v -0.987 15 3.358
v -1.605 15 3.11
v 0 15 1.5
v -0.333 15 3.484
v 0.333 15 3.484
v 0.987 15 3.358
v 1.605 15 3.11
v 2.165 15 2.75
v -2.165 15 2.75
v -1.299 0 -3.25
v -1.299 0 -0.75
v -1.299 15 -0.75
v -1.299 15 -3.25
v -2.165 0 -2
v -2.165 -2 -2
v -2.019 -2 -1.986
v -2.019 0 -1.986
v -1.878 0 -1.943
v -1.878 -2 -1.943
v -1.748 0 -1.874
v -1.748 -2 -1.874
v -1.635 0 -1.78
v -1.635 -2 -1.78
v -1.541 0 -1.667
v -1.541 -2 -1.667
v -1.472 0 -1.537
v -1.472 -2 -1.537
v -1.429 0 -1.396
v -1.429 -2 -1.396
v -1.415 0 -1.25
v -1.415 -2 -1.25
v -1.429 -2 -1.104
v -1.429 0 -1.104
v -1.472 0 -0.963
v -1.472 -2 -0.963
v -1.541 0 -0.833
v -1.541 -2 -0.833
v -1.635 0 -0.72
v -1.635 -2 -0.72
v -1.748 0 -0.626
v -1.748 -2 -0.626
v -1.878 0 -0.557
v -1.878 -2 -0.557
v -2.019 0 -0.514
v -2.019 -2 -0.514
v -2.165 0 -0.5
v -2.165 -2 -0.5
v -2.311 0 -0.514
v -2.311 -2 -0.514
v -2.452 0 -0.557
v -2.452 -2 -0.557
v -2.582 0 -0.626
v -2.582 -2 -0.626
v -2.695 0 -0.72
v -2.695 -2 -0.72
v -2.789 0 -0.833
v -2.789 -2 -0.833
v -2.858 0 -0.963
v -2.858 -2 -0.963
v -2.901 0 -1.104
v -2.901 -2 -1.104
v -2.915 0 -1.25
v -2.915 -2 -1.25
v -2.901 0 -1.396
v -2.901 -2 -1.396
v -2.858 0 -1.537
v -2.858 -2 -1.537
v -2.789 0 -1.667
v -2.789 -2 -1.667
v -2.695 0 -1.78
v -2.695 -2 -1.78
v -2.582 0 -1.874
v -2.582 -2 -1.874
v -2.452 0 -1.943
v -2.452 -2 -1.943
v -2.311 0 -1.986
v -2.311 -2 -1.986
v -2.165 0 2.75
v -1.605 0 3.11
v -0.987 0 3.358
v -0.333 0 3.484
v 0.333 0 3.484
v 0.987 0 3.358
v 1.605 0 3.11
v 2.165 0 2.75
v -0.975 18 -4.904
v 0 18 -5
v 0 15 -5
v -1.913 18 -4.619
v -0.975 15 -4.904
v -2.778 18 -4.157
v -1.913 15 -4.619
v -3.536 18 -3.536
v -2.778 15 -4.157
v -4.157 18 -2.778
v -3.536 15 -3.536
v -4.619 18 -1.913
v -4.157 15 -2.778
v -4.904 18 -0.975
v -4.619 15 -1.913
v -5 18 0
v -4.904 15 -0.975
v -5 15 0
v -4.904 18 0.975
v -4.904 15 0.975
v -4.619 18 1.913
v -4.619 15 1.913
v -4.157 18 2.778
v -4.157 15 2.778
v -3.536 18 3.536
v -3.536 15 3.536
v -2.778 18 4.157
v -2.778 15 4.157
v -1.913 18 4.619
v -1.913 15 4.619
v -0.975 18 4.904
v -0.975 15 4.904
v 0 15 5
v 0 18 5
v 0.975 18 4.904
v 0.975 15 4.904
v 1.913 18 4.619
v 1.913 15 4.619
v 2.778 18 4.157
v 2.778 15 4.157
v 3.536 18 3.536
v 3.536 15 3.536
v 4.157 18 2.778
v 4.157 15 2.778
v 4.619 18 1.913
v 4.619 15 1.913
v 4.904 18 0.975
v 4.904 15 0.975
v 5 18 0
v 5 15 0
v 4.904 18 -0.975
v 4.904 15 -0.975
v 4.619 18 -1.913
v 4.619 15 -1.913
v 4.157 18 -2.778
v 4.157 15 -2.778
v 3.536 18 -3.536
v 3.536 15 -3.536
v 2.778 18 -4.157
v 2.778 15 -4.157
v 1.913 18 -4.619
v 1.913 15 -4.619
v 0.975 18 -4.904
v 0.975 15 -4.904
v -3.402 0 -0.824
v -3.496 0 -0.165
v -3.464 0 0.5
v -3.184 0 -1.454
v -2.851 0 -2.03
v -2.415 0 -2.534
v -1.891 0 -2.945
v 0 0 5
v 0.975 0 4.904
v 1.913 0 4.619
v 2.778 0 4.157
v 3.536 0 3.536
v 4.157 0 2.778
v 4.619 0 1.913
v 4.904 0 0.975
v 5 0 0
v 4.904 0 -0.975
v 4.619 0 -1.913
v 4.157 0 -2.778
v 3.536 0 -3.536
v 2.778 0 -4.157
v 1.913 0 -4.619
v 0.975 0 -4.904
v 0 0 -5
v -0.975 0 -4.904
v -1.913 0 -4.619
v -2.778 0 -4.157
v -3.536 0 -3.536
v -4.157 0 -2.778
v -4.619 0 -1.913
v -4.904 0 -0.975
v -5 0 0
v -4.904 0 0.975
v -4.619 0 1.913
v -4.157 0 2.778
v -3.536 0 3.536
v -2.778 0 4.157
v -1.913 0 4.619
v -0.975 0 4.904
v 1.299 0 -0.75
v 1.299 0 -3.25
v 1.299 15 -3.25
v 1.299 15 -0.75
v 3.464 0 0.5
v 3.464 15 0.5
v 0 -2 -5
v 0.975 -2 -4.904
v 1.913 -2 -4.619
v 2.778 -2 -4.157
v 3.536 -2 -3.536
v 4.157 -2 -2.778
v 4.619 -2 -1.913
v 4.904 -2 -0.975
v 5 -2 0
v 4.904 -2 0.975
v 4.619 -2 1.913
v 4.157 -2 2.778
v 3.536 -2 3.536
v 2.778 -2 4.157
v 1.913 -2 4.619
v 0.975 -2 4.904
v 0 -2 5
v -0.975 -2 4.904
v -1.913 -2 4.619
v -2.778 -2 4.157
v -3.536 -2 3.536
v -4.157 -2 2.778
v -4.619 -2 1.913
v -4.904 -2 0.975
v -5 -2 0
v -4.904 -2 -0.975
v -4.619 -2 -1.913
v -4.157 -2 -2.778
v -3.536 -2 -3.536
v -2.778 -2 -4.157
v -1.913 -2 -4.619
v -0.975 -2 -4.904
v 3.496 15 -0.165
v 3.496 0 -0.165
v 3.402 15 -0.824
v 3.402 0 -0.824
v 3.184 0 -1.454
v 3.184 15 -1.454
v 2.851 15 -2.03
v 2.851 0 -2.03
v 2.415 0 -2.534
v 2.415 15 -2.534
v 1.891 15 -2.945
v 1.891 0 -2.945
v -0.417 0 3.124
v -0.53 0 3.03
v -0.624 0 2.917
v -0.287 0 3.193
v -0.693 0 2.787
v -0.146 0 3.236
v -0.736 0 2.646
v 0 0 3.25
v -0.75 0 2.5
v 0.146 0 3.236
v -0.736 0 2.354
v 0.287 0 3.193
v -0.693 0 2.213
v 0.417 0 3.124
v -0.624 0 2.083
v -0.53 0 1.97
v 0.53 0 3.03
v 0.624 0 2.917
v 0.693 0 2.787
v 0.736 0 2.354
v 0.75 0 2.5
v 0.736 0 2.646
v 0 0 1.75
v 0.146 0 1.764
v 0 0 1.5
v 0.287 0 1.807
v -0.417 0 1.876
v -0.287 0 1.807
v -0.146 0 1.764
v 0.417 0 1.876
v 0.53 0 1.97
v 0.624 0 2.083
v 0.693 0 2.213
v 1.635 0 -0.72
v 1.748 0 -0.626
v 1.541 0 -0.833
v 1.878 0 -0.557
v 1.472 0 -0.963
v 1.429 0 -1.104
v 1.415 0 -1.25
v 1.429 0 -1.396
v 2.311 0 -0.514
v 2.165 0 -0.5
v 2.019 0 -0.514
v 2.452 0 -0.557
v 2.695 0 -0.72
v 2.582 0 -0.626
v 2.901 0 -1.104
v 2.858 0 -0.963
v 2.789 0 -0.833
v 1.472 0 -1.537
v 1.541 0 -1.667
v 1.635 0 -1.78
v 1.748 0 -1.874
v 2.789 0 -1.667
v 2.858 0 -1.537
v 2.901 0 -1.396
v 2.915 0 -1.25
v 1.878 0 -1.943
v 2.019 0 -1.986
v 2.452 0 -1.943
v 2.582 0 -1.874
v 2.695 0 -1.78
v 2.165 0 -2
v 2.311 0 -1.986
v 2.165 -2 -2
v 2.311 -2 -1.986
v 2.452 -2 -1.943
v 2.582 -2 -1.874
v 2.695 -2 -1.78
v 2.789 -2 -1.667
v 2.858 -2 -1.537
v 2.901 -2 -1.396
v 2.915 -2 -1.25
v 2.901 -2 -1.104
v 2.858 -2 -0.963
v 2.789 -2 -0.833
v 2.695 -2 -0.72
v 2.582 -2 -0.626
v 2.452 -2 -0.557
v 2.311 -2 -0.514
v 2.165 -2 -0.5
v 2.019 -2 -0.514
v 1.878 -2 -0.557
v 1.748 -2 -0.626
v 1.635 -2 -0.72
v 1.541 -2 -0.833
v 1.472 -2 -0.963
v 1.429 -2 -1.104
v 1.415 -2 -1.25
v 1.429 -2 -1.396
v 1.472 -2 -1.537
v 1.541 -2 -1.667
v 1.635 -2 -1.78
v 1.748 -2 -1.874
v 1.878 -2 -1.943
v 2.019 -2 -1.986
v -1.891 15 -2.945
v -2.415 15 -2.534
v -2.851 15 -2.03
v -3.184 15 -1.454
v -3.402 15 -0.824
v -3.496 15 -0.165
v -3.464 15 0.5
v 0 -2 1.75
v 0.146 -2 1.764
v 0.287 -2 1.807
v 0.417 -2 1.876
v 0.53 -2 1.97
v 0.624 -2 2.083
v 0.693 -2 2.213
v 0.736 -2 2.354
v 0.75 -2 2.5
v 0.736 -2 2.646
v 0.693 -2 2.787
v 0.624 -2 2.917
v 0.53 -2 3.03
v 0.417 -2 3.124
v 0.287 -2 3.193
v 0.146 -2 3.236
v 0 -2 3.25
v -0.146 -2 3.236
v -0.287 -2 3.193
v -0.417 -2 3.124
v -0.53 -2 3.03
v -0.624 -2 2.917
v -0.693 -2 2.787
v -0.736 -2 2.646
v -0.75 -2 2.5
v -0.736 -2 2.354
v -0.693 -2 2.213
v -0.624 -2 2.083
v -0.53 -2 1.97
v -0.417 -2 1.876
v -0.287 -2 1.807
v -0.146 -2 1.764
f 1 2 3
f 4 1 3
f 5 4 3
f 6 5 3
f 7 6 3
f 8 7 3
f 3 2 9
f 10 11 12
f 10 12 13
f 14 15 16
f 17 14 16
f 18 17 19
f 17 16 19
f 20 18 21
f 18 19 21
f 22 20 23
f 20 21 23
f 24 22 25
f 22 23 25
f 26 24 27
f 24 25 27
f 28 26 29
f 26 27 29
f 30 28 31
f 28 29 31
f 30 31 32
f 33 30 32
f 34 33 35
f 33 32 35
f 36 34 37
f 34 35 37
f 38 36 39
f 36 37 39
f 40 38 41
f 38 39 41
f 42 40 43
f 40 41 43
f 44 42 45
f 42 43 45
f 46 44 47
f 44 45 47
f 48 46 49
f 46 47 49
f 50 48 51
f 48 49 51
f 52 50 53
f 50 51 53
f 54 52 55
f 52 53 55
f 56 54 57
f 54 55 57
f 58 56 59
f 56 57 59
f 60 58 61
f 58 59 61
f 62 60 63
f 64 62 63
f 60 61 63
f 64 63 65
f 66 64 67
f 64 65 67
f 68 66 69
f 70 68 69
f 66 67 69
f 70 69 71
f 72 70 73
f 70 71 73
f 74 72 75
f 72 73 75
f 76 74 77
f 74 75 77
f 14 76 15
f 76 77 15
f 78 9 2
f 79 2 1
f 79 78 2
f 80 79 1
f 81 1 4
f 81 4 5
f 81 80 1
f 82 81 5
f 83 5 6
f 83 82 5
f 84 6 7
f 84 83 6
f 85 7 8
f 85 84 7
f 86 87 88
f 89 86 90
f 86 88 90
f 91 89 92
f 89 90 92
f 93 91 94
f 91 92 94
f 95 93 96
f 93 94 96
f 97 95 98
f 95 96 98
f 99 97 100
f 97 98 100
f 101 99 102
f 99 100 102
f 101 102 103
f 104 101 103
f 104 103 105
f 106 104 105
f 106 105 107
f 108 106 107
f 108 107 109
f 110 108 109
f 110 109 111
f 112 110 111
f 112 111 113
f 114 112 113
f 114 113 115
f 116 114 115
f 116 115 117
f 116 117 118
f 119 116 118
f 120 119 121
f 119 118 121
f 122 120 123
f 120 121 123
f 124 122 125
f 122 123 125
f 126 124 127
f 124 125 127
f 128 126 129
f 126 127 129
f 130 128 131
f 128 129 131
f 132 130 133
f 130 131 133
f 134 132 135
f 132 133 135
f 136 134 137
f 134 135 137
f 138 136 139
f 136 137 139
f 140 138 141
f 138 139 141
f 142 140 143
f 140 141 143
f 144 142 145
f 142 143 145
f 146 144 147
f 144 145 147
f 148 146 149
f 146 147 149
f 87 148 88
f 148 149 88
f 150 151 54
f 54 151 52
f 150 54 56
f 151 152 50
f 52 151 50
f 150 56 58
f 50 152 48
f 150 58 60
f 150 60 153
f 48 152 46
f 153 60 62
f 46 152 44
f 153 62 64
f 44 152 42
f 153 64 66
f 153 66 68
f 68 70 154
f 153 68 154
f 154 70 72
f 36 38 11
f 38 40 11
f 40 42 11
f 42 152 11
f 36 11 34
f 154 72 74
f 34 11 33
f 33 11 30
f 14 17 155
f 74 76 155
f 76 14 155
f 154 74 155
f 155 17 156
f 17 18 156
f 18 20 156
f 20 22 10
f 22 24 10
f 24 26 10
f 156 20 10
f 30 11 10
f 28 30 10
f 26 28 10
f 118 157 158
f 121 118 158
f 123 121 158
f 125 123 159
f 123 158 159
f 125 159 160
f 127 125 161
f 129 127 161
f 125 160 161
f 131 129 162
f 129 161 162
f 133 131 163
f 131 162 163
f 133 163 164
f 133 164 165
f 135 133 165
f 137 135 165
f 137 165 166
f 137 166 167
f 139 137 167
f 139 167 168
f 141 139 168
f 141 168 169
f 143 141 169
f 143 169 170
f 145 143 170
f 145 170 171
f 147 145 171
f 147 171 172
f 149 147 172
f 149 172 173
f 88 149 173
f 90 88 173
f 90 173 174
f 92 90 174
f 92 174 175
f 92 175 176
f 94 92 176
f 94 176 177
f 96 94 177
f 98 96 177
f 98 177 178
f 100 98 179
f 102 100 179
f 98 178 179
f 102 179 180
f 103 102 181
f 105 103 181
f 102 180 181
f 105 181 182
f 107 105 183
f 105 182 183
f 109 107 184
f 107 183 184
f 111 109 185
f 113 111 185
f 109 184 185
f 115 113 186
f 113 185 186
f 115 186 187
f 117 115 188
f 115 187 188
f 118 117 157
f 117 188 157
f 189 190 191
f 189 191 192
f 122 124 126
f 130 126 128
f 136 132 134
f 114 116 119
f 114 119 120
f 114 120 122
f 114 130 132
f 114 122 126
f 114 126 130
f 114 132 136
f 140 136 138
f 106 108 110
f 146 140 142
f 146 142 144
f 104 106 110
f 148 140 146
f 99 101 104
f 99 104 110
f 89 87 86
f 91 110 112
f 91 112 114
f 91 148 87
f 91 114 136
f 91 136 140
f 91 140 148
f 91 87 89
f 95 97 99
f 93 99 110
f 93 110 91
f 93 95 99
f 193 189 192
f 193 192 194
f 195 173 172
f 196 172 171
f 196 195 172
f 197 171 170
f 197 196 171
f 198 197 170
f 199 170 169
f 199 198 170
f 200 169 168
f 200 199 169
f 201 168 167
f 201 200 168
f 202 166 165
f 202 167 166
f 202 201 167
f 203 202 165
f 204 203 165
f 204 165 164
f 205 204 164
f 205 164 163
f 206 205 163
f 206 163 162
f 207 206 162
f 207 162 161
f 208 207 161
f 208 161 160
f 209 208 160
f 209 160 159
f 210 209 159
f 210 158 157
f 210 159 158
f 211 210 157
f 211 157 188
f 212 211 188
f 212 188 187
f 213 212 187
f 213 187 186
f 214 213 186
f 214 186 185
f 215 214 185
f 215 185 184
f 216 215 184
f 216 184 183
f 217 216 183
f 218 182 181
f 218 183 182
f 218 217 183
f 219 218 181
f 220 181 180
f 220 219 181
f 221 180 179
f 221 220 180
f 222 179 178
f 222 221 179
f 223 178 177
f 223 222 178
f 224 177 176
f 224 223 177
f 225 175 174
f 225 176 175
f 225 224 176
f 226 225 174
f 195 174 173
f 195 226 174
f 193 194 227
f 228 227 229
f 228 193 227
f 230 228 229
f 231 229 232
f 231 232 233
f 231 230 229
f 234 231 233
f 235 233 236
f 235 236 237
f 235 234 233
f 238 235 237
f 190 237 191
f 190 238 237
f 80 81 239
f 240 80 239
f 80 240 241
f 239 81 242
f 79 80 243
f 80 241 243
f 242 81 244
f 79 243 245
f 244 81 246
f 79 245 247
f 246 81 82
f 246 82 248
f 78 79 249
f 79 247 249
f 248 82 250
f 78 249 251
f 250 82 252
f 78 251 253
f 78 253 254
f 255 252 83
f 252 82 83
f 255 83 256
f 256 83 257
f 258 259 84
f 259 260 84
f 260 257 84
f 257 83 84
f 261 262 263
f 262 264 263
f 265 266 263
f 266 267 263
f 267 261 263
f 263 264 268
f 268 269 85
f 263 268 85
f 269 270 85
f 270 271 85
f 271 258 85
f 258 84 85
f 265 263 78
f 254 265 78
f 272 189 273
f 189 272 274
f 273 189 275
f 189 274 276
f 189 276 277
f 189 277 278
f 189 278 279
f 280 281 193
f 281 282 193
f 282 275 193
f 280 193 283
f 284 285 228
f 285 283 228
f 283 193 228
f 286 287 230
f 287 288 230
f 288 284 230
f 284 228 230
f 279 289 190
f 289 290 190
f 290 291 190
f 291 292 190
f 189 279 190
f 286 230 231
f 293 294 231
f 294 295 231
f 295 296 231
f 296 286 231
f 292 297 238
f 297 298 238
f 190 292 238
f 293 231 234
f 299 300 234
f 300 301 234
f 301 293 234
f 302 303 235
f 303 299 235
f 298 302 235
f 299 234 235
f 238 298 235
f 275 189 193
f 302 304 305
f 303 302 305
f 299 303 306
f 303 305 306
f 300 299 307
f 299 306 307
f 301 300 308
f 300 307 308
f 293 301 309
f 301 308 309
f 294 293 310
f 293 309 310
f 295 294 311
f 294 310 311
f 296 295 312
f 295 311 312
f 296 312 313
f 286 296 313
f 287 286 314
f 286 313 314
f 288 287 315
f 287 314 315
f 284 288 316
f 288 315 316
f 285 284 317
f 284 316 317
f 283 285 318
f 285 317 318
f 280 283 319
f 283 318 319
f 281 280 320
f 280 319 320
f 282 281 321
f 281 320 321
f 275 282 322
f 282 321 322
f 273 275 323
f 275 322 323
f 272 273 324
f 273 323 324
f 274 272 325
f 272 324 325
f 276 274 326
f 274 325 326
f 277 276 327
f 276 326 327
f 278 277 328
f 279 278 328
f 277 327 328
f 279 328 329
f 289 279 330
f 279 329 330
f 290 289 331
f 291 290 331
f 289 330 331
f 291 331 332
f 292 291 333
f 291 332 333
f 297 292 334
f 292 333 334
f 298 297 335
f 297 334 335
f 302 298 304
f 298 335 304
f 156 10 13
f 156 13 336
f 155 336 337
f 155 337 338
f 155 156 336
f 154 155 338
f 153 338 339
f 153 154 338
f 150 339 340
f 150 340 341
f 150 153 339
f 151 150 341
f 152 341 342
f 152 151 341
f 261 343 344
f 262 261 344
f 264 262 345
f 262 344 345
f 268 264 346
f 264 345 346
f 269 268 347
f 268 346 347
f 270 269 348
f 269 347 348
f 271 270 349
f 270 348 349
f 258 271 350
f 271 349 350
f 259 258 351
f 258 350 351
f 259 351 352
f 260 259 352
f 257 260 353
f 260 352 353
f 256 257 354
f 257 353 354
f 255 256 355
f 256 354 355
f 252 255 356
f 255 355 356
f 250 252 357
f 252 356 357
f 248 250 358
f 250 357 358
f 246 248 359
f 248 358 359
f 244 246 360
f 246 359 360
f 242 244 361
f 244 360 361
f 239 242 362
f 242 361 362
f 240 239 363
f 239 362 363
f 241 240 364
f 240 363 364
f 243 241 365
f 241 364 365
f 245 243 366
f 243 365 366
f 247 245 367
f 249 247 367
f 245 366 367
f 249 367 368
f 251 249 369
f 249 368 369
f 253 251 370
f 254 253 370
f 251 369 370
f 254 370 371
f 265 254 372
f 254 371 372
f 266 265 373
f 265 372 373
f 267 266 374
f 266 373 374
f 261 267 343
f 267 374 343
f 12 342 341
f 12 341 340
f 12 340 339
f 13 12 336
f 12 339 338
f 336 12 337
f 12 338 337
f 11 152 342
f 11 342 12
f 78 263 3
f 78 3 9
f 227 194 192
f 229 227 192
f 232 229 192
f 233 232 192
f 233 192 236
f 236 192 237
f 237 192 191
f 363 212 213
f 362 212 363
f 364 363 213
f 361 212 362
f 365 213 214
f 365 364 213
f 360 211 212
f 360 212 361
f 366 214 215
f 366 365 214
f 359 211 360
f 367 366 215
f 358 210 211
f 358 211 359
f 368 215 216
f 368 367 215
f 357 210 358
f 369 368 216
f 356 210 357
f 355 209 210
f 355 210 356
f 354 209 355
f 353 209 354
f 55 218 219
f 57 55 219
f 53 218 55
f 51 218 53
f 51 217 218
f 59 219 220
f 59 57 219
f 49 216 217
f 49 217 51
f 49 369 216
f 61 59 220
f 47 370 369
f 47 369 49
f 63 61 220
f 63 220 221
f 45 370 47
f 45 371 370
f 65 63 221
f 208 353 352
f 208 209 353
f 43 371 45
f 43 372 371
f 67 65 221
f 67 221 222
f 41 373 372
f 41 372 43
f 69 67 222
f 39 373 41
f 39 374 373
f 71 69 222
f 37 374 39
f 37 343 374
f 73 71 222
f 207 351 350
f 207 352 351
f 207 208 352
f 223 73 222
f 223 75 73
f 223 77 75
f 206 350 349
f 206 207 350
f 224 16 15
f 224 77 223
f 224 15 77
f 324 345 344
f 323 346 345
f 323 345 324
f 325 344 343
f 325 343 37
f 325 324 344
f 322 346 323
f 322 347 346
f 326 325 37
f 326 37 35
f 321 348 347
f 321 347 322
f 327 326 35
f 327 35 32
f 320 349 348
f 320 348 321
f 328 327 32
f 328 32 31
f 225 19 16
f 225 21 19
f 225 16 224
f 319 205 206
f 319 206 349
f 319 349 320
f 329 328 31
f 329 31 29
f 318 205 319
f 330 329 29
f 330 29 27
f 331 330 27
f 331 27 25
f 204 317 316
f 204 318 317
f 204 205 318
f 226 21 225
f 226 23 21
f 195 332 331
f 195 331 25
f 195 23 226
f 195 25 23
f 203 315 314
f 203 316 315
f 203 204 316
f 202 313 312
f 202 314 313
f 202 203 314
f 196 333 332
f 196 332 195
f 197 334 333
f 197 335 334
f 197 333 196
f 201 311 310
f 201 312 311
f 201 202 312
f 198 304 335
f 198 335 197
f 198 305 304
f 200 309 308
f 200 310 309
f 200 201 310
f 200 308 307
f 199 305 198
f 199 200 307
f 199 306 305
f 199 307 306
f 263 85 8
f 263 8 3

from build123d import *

# Parameters (mm, degrees)
SKETCH2_R           = 5
BOSS_EXTRUDE1_DEPTH = 15
BOSS_EXTRUDE2_START = 2
SKETCH3_R           = 5
SKETCH3_R_2         = 0.75
BOSS_EXTRUDE2_DEPTH = 2
SKETCH4_R           = 5
BOSS_EXTRUDE3_DEPTH = 3


with BuildPart() as part:
    # Sketch2 → Boss-Extrude1 (new body)
    with BuildSketch(Plane(origin=(0, 0, 0), x_dir=(1, 0, 0), z_dir=(0, 1, 0))):
        with Locations(Location((0, 0, 0), (0, 0, 270))):
            Circle(SKETCH2_R)
        with BuildLine():
            Line((1.299038106, 0.75), (3.464101615, -0.5))
            ThreePointArc((3.464101615, -0.5), (3.031088913, 1.75), (1.299038106, 3.25))
            Line((1.299038106, 3.25), (1.299038106, 0.75))
        make_face(mode=Mode.SUBTRACT)
        with BuildLine():
            Line((-1.299038106, 0.75), (-1.299038106, 3.25))
            ThreePointArc((-1.299038106, 3.25), (-3.031088913, 1.75), (-3.464101615, -0.5))
            Line((-3.464101615, -0.5), (-1.299038106, 0.75))
        make_face(mode=Mode.SUBTRACT)
        with BuildLine():
            Line((0, -1.5), (-2.165063509, -2.75))
            ThreePointArc((-2.165063509, -2.75), (0, -3.5), (2.165063509, -2.75))
            Line((2.165063509, -2.75), (0, -1.5))
        make_face(mode=Mode.SUBTRACT)
    extrude(amount=BOSS_EXTRUDE1_DEPTH)

    # Sketch3 → Boss-Extrude2 (add)
    with BuildSketch(Plane.XZ.offset(BOSS_EXTRUDE2_START)):
        with Locations(Location((0, 0, 0), (0, 0, 270))):
            Circle(SKETCH3_R)
        with Locations(Location((0, 2.5, 0), (0, 0, 270))):
            Circle(SKETCH3_R_2, mode=Mode.SUBTRACT)
        with Locations(Location((2.165063509, -1.25, 0), (0, 0, 270))):
            Circle(SKETCH3_R_2, mode=Mode.SUBTRACT)
        with Locations(Location((-2.165063509, -1.25, 0), (0, 0, 270))):
            Circle(SKETCH3_R_2, mode=Mode.SUBTRACT)
    extrude(amount=-BOSS_EXTRUDE2_DEPTH)

    # Sketch4 → Boss-Extrude3 (add)
    with BuildSketch(Plane(origin=(0, 15, 0), x_dir=(1, 0, 0), z_dir=(0, 1, 0))):
        with Locations(Location((0, 0, 0), (0, 0, 90))):
            Circle(SKETCH4_R)
    extrude(amount=BOSS_EXTRUDE3_DEPTH)


solid = part.part
